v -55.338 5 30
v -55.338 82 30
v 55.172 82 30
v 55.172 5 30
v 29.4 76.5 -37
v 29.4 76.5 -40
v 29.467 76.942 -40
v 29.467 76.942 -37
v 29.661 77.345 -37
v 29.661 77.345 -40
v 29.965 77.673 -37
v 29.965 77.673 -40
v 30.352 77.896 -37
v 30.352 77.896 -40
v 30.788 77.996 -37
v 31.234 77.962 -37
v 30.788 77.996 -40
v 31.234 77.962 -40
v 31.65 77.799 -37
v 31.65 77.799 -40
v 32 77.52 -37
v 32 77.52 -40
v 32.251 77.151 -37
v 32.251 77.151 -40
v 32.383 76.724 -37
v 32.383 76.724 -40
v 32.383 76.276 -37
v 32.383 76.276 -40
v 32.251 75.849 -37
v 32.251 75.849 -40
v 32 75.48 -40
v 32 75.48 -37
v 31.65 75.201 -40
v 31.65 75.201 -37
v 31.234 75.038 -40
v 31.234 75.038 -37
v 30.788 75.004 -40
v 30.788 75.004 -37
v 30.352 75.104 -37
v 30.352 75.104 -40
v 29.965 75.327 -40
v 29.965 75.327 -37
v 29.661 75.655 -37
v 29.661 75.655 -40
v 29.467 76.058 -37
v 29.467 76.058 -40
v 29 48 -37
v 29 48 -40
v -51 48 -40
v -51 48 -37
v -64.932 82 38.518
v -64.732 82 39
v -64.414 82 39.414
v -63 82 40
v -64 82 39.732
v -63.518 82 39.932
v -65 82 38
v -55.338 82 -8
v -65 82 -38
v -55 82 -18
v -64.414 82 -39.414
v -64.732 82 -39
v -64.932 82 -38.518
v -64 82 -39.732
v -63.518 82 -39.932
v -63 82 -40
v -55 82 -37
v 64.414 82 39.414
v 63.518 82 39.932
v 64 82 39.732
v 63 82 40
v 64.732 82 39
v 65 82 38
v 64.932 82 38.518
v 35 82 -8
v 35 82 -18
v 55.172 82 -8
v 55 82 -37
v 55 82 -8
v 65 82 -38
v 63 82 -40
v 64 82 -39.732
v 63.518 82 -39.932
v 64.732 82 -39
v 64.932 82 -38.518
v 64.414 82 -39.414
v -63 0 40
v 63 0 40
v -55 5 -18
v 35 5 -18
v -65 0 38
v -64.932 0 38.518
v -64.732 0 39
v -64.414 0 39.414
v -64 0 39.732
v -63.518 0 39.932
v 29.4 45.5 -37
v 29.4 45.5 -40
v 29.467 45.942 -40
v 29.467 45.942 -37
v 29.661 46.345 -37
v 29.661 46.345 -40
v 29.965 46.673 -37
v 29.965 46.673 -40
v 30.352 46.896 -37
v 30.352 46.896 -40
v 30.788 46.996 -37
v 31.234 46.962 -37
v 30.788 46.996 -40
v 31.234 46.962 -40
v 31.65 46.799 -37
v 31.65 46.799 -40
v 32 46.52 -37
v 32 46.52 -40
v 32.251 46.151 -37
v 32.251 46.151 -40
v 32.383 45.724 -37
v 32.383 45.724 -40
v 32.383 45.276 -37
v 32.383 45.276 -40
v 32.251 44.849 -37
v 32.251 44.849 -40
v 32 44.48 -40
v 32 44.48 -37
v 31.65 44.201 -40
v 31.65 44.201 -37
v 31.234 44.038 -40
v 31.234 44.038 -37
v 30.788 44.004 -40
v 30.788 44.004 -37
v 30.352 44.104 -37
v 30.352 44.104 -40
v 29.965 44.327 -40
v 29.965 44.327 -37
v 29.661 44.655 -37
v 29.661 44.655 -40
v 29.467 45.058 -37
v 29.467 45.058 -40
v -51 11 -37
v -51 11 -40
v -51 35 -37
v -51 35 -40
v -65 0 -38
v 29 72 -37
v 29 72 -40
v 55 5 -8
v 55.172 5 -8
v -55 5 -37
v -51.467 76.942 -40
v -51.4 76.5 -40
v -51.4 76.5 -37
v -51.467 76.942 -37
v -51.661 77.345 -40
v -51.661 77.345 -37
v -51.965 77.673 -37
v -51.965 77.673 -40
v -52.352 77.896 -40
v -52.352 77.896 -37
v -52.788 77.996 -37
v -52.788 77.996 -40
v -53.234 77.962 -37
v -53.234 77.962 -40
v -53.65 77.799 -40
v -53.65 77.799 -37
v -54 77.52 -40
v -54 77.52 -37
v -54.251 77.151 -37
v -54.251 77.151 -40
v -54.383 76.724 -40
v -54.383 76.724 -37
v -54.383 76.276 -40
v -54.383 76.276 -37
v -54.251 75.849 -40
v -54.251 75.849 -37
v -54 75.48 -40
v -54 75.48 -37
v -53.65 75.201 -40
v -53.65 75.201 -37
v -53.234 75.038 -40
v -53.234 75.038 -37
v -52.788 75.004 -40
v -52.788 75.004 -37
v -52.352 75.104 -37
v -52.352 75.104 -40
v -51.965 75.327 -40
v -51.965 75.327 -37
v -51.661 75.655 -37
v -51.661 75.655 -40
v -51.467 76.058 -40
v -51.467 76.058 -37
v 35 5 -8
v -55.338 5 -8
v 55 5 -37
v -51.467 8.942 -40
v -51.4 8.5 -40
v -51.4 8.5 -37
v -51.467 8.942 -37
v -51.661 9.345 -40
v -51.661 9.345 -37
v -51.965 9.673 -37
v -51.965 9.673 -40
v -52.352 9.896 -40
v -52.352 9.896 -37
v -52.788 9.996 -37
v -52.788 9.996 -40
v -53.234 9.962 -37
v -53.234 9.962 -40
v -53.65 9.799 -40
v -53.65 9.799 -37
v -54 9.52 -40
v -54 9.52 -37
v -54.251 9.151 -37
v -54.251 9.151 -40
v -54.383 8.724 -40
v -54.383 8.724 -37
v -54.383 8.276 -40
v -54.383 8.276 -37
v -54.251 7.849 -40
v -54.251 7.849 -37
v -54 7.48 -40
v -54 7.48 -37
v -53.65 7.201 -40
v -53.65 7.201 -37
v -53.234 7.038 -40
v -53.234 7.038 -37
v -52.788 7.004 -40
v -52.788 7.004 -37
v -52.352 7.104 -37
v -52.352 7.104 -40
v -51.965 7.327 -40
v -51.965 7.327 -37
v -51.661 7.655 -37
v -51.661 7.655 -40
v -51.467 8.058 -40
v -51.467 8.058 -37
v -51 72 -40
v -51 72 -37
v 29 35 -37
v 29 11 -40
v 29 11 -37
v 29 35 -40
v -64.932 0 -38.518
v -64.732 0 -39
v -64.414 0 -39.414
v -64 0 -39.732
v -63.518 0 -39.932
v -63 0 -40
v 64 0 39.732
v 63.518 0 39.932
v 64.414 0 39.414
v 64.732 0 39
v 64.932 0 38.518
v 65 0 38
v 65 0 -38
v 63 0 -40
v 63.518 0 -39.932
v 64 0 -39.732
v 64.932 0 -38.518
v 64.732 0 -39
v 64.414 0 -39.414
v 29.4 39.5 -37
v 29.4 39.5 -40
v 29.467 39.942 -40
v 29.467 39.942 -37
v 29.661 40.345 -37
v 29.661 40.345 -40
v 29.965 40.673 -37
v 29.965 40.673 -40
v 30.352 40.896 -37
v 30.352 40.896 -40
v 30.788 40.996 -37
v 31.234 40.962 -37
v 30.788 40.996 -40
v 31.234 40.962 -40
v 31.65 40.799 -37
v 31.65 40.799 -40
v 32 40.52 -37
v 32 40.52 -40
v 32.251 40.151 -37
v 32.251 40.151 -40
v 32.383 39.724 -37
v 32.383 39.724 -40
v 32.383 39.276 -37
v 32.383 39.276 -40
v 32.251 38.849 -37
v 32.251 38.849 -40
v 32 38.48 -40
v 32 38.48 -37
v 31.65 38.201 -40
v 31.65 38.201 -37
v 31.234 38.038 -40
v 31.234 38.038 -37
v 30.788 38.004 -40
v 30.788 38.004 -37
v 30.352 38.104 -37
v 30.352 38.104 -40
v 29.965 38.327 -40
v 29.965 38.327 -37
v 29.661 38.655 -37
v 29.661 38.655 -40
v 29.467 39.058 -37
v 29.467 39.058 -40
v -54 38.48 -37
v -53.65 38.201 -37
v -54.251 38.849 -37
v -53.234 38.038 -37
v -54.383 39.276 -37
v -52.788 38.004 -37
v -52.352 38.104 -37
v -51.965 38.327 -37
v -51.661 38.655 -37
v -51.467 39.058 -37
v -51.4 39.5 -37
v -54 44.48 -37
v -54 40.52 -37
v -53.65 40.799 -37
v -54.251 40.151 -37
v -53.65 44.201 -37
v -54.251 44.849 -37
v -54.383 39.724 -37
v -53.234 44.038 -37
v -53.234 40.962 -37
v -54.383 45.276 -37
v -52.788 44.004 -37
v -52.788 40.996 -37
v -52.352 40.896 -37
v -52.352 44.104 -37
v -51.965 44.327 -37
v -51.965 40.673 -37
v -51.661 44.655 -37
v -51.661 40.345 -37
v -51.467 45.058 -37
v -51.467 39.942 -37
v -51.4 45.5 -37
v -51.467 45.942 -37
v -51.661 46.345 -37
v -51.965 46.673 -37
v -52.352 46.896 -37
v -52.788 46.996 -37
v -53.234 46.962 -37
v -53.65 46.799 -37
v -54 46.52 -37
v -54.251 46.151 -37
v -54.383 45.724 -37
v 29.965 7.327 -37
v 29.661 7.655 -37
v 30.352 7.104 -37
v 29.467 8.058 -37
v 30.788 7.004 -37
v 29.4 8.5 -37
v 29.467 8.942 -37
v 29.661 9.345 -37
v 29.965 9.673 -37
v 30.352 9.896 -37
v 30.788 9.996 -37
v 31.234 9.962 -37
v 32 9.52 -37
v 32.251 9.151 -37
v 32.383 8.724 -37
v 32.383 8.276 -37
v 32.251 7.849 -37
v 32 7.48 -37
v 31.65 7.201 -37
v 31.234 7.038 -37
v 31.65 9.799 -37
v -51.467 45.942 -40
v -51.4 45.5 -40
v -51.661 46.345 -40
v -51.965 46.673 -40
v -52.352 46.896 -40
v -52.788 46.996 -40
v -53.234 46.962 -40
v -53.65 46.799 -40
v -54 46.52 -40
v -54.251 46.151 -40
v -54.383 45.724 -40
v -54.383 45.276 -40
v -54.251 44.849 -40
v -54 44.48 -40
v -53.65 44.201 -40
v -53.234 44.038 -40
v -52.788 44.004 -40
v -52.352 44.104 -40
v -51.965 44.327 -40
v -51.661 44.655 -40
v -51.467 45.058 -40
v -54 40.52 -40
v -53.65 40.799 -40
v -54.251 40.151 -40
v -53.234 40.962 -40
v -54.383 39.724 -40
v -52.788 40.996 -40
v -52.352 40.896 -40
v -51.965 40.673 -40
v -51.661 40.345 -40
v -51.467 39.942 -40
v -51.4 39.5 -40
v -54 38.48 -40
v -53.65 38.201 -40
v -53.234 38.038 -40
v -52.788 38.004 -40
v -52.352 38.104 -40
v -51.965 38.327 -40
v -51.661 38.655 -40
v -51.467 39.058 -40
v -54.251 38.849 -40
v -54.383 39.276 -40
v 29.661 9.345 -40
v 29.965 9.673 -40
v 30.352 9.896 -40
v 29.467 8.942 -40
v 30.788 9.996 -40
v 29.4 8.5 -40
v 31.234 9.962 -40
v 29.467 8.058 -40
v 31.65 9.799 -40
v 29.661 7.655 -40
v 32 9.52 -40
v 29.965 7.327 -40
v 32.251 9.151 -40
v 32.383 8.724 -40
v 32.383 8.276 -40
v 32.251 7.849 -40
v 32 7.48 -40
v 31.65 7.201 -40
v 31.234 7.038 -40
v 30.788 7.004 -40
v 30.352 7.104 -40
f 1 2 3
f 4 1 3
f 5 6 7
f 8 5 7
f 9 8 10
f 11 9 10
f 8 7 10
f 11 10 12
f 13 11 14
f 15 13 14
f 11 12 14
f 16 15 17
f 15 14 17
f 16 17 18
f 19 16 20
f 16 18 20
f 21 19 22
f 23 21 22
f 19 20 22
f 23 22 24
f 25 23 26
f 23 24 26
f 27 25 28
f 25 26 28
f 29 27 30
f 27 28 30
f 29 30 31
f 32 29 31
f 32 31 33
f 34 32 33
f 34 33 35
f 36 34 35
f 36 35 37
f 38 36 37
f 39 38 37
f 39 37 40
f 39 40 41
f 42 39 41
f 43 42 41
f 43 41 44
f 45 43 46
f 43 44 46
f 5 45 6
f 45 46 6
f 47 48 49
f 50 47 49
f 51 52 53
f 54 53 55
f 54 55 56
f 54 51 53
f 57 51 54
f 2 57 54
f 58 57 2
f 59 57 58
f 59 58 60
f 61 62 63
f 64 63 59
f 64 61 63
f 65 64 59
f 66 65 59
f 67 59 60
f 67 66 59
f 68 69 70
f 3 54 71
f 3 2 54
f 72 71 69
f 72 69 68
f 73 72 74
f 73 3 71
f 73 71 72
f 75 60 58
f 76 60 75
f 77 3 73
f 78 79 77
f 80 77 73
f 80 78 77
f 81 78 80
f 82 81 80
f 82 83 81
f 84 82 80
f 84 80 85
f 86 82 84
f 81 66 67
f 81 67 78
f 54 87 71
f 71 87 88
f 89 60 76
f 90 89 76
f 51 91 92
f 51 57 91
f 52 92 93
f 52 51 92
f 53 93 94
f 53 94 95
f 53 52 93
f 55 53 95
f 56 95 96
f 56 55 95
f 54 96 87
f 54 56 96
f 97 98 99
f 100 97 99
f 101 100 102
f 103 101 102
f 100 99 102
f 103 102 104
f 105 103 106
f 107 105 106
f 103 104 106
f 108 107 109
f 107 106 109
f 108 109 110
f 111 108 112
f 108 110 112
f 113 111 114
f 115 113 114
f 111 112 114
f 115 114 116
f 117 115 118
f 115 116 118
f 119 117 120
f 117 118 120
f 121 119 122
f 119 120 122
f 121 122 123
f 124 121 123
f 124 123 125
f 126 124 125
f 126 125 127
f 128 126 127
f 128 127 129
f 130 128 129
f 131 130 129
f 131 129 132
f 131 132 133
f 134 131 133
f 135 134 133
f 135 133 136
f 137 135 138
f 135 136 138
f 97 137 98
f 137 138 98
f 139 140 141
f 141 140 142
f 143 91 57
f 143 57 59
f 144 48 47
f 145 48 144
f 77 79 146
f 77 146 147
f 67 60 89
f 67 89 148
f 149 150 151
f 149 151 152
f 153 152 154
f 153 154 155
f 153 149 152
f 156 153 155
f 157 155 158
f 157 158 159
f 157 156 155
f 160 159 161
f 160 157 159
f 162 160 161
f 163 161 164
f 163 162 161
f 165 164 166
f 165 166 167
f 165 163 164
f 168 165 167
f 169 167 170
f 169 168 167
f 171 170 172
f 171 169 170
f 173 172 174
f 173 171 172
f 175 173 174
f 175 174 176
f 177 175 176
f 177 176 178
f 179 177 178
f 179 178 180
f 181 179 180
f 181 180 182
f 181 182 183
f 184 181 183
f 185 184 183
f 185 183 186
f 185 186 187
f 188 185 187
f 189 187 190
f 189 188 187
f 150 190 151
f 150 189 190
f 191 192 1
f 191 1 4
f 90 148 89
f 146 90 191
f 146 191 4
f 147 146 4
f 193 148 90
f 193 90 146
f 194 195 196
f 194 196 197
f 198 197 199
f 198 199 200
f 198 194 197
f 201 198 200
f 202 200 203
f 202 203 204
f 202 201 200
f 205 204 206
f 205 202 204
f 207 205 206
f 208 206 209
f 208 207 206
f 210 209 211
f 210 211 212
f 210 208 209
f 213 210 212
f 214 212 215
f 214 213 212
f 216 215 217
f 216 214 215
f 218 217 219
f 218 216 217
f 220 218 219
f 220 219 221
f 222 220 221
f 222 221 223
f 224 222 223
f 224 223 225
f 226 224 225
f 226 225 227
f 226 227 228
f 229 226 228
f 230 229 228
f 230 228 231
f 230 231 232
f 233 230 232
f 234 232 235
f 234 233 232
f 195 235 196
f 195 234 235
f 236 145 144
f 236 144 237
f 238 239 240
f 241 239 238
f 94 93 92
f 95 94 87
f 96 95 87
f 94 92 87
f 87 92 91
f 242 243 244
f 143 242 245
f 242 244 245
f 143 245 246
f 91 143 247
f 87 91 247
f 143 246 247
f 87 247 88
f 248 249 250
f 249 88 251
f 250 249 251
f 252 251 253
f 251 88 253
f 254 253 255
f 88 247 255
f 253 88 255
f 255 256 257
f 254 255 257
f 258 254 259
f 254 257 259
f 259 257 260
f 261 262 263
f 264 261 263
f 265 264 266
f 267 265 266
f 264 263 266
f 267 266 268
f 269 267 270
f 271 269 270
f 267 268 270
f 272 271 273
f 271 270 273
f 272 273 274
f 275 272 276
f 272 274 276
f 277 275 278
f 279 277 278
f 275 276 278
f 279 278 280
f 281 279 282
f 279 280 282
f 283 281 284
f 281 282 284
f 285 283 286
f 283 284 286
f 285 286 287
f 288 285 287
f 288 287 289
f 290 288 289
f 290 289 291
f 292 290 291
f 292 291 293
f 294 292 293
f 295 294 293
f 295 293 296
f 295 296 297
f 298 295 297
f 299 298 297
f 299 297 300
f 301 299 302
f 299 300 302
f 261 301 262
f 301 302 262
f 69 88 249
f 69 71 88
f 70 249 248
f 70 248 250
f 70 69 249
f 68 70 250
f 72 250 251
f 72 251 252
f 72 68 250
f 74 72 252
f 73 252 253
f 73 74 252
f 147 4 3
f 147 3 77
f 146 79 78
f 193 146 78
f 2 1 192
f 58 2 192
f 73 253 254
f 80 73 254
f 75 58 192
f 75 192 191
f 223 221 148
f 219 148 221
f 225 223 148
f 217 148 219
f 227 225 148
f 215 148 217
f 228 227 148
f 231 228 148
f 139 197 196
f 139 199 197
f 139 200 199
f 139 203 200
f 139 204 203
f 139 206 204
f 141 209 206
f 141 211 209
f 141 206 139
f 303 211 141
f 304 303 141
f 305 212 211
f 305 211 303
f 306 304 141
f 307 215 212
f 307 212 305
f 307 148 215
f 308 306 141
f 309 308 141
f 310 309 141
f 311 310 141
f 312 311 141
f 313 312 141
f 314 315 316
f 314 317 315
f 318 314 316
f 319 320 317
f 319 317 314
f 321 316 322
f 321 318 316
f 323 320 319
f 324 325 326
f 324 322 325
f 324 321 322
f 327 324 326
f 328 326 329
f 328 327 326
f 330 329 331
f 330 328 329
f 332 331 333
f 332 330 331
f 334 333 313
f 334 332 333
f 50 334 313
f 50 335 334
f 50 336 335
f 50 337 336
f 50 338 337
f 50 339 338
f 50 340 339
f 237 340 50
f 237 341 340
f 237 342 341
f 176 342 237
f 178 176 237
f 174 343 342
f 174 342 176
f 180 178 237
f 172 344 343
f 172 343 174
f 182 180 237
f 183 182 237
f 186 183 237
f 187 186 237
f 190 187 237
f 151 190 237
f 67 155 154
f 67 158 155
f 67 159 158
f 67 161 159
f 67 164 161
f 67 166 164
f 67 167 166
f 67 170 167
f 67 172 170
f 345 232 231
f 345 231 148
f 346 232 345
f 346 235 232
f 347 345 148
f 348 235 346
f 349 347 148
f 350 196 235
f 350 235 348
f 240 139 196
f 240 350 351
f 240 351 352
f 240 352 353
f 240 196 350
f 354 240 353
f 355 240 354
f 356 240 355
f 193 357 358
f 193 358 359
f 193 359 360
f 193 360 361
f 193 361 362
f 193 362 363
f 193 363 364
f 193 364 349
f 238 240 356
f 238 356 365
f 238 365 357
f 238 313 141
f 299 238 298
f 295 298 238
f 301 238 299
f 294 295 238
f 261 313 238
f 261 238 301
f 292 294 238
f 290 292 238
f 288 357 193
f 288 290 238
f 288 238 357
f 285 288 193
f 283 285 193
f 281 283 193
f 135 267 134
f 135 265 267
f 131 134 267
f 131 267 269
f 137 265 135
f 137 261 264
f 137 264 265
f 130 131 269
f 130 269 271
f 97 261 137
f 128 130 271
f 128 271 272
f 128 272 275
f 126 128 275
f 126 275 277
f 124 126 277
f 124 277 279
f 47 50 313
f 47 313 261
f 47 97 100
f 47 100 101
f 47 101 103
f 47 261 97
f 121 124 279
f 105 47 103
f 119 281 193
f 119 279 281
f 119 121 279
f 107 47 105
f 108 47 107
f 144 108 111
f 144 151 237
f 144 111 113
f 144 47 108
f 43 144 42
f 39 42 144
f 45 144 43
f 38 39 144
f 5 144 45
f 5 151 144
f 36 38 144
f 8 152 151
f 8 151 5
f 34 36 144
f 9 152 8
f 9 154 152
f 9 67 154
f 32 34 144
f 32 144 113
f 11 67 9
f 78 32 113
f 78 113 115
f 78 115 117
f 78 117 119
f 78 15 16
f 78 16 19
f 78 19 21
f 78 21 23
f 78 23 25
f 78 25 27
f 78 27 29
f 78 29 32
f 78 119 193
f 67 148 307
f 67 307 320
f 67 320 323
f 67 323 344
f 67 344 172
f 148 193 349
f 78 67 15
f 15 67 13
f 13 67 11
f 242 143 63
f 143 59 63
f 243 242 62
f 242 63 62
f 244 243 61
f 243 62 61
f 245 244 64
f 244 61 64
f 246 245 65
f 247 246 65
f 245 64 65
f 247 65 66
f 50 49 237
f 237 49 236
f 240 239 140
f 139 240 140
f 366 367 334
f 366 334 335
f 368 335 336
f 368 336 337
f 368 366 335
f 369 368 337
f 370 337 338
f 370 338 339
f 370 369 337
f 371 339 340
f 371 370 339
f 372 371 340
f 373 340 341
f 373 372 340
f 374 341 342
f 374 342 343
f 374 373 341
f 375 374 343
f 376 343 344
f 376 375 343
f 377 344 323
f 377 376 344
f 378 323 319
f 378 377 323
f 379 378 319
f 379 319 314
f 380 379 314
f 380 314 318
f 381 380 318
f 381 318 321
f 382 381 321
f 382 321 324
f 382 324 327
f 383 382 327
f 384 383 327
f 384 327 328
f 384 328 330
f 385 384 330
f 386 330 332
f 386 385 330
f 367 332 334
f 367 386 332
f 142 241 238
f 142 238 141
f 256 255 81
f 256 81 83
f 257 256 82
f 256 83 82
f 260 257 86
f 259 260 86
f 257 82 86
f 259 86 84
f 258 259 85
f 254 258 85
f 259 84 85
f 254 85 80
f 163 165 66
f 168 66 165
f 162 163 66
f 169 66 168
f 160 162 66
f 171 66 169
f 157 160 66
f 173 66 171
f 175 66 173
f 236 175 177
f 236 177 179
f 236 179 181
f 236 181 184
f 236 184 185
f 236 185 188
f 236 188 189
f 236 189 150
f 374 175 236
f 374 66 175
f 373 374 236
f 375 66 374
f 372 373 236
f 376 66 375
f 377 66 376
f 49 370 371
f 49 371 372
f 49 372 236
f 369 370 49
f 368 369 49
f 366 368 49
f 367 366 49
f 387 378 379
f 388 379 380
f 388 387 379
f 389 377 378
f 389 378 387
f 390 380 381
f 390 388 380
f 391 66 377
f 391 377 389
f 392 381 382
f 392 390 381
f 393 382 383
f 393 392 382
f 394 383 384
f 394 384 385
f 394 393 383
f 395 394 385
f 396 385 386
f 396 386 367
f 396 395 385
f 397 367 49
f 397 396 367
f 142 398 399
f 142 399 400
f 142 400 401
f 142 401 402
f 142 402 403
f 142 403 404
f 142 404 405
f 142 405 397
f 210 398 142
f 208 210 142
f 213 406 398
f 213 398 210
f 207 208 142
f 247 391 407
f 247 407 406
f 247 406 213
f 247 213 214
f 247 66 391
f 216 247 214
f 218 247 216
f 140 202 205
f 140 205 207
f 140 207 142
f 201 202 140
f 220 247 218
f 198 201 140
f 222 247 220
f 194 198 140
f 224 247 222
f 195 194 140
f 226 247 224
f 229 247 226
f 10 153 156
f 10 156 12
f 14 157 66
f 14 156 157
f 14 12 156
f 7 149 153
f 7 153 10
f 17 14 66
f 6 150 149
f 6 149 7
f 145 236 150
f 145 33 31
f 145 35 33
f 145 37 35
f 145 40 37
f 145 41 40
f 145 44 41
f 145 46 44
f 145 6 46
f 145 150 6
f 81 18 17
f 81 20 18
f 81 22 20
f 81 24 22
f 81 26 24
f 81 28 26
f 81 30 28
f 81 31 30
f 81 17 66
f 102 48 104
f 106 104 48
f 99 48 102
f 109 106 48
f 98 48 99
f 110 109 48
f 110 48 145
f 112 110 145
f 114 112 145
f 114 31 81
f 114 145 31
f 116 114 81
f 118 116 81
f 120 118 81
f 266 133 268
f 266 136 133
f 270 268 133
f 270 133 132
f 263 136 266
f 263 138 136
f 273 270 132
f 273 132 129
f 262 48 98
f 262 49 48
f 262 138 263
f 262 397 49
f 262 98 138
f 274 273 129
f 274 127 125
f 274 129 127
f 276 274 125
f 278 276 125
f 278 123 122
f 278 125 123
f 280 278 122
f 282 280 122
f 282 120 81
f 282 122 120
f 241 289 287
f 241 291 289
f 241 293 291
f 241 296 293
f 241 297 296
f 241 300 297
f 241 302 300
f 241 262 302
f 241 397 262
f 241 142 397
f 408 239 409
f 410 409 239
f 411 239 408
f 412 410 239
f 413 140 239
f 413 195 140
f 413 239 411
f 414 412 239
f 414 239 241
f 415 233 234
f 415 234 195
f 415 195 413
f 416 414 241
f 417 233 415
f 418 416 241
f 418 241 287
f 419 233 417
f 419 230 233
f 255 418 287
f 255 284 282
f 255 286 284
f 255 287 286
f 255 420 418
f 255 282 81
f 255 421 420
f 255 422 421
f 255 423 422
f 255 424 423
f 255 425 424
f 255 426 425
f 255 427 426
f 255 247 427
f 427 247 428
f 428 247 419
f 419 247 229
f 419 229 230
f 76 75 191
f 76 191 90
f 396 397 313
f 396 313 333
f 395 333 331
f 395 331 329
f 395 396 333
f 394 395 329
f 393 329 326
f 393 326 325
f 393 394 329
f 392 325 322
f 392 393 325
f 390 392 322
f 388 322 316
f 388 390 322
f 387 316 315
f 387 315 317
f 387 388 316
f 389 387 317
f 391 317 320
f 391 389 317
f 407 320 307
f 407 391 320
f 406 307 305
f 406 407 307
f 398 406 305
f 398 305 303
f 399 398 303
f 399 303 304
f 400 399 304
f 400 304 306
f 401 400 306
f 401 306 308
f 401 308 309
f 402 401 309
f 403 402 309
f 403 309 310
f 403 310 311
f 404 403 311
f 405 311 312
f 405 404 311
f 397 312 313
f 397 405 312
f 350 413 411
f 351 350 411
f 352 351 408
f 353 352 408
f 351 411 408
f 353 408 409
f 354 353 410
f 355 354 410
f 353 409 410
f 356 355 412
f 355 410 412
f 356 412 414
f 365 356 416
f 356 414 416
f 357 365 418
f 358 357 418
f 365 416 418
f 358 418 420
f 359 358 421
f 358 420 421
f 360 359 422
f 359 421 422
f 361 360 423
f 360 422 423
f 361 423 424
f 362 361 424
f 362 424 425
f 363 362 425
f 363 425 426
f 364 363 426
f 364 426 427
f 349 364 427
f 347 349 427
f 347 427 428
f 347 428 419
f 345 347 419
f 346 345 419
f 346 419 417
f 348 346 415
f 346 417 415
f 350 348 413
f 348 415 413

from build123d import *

# Parameters (mm, degrees)
ESQUISSE1_W              = 130
ESQUISSE1_H              = 80
BOSS_EXTRU_1_DEPTH       = 82
ESQUISSE4_W              = 110
ESQUISSE4_H              = 19
ENL_V_MAT_EXTRU_1_DEPTH  = 77
ESQUISSE7_W              = 80
ESQUISSE7_H              = 24
ENL_V_MAT_EXTRU_2_DEPTH  = 5
ESQUISSE8_W              = 80
ESQUISSE8_H              = 24
ENL_V_MAT_EXTRU_3_DEPTH  = 5
CONG_1_R                 = 2
ESQUISSE9_W              = 110.509811946
ESQUISSE9_H              = 38
ENL_V_MAT_EXTRU_4_DEPTH  = 77
ESQUISSE10_W             = 20
ESQUISSE10_H             = 10
ENL_V_MAT_EXTRU_5_DEPTH  = 77
ESQUISSE11_R             = 1.5
ENL_V_MAT_EXTRU_6_DEPTH  = 3
ESQUISSE12_R             = 1.5
ENL_V_MAT_EXTRU_7_DEPTH  = 3
ESQUISSE13_R             = 1.5
ENL_V_MAT_EXTRU_8_DEPTH  = 3
ESQUISSE14_R             = 1.5
ENL_V_MAT_EXTRU_11_DEPTH = 3


with BuildPart() as part:
    # Esquisse1 → Boss.-Extru.1 (new body)
    with BuildSketch(Plane(origin=(0, 0, 0), x_dir=(1, 0, 0), z_dir=(0, 1, 0))):
        Rectangle(ESQUISSE1_W, ESQUISSE1_H)
    extrude(amount=BOSS_EXTRU_1_DEPTH)

    # Esquisse4 → Enlèv. mat.-Extru.1 (cut)
    with BuildSketch(Plane(origin=(0, 82, 0), x_dir=(1, 0, 0), z_dir=(0, 1, 0))):
        with Locations((0, 27.5)):
            Rectangle(ESQUISSE4_W, ESQUISSE4_H)
    extrude(amount=-ENL_V_MAT_EXTRU_1_DEPTH, mode=Mode.SUBTRACT)

    # Esquisse7 → Enlèv. mat.-Extru.2 (cut)
    with BuildSketch(Plane(origin=(0, 0, -40), x_dir=(-1, 0, 0), z_dir=(0, 0, -1))):
        with Locations((11, 23)):
            Rectangle(ESQUISSE7_W, ESQUISSE7_H)
    extrude(amount=-ENL_V_MAT_EXTRU_2_DEPTH, mode=Mode.SUBTRACT)

    # Esquisse8 → Enlèv. mat.-Extru.3 (cut)
    with BuildSketch(Plane(origin=(0, 0, -40), x_dir=(-1, 0, 0), z_dir=(0, 0, -1))):
        with Locations((11, 60)):
            Rectangle(ESQUISSE8_W, ESQUISSE8_H)
    extrude(amount=-ENL_V_MAT_EXTRU_3_DEPTH, mode=Mode.SUBTRACT)

    # Congé1
    cong_1_edges = [part.edges().sort_by_distance(p)[0] for p in [
        (-65, 41, -40),
        (65, 41, -40),
        (65, 41, 40),
        (-65, 41, 40),
    ]]
    fillet(cong_1_edges, radius=CONG_1_R)

    # Esquisse9 → Enlèv. mat.-Extru.4 (cut)
    with BuildSketch(Plane(origin=(0, 82, 0), x_dir=(1, 0, 0), z_dir=(0, 1, 0))):
        with Locations((-0.082965324, -11)):
            Rectangle(ESQUISSE9_W, ESQUISSE9_H)
    extrude(amount=-ENL_V_MAT_EXTRU_4_DEPTH, mode=Mode.SUBTRACT)

    # Esquisse10 → Enlèv. mat.-Extru.5 (cut)
    with BuildSketch(Plane(origin=(0, 82, 0), x_dir=(1, 0, 0), z_dir=(0, 1, 0))):
        with Locations((45, 13)):
            Rectangle(ESQUISSE10_W, ESQUISSE10_H)
    extrude(amount=-ENL_V_MAT_EXTRU_5_DEPTH, mode=Mode.SUBTRACT)

    # Esquisse11 → Enlèv. mat.-Extru.6 (cut)
    with BuildSketch(Plane(origin=(0, 0, -40), x_dir=(-1, 0, 0), z_dir=(0, 0, -1))):
        with Locations((-30.9, 39.5)):
            Circle(ESQUISSE11_R)
    enl_v_mat_extru_6 = extrude(amount=-ENL_V_MAT_EXTRU_6_DEPTH, mode=Mode.SUBTRACT)

    # Esquisse12 → Enlèv. mat.-Extru.7 (cut)
    with BuildSketch(Plane(origin=(0, 0, -40), x_dir=(-1, 0, 0), z_dir=(0, 0, -1))):
        with Locations((-30.9, 45.5)):
            Circle(ESQUISSE12_R)
    enl_v_mat_extru_7 = extrude(amount=-ENL_V_MAT_EXTRU_7_DEPTH, mode=Mode.SUBTRACT)

    # Symétrie1: Enlèv. mat.-Extru.6, Enlèv. mat.-Extru.7 across plane
    add(enl_v_mat_extru_6.mirror(Plane(origin=(-11, 0, 0), x_dir=(0, 0, 1), z_dir=(1, 0, 0))), mode=Mode.SUBTRACT)
    add(enl_v_mat_extru_7.mirror(Plane(origin=(-11, 0, 0), x_dir=(0, 0, 1), z_dir=(1, 0, 0))), mode=Mode.SUBTRACT)

    # Esquisse13 → Enlèv. mat.-Extru.8 (cut)
    with BuildSketch(Plane(origin=(0, 0, -40), x_dir=(-1, 0, 0), z_dir=(0, 0, -1))):
        with Locations((-30.9, 76.5)):
            Circle(ESQUISSE13_R)
    enl_v_mat_extru_8 = extrude(amount=-ENL_V_MAT_EXTRU_8_DEPTH, mode=Mode.SUBTRACT)

    # Symétrie2: Enlèv. mat.-Extru.8 across plane
    add(enl_v_mat_extru_8.mirror(Plane(origin=(-11, 0, 0), x_dir=(0, 0, 1), z_dir=(1, 0, 0))), mode=Mode.SUBTRACT)

    # Esquisse14 → Enlèv. mat.-Extru.11 (cut)
    with BuildSketch(Plane(origin=(0, 0, -40), x_dir=(-1, 0, 0), z_dir=(0, 0, -1))):
        with Locations((-30.9, 8.5)):
            Circle(ESQUISSE14_R)
    enl_v_mat_extru_11 = extrude(amount=-ENL_V_MAT_EXTRU_11_DEPTH, mode=Mode.SUBTRACT)

    # Symétrie3: Enlèv. mat.-Extru.11 across plane
    add(enl_v_mat_extru_11.mirror(Plane(origin=(-11, 0, 0), x_dir=(0, 0, 1), z_dir=(1, 0, 0))), mode=Mode.SUBTRACT)


solid = part.part
